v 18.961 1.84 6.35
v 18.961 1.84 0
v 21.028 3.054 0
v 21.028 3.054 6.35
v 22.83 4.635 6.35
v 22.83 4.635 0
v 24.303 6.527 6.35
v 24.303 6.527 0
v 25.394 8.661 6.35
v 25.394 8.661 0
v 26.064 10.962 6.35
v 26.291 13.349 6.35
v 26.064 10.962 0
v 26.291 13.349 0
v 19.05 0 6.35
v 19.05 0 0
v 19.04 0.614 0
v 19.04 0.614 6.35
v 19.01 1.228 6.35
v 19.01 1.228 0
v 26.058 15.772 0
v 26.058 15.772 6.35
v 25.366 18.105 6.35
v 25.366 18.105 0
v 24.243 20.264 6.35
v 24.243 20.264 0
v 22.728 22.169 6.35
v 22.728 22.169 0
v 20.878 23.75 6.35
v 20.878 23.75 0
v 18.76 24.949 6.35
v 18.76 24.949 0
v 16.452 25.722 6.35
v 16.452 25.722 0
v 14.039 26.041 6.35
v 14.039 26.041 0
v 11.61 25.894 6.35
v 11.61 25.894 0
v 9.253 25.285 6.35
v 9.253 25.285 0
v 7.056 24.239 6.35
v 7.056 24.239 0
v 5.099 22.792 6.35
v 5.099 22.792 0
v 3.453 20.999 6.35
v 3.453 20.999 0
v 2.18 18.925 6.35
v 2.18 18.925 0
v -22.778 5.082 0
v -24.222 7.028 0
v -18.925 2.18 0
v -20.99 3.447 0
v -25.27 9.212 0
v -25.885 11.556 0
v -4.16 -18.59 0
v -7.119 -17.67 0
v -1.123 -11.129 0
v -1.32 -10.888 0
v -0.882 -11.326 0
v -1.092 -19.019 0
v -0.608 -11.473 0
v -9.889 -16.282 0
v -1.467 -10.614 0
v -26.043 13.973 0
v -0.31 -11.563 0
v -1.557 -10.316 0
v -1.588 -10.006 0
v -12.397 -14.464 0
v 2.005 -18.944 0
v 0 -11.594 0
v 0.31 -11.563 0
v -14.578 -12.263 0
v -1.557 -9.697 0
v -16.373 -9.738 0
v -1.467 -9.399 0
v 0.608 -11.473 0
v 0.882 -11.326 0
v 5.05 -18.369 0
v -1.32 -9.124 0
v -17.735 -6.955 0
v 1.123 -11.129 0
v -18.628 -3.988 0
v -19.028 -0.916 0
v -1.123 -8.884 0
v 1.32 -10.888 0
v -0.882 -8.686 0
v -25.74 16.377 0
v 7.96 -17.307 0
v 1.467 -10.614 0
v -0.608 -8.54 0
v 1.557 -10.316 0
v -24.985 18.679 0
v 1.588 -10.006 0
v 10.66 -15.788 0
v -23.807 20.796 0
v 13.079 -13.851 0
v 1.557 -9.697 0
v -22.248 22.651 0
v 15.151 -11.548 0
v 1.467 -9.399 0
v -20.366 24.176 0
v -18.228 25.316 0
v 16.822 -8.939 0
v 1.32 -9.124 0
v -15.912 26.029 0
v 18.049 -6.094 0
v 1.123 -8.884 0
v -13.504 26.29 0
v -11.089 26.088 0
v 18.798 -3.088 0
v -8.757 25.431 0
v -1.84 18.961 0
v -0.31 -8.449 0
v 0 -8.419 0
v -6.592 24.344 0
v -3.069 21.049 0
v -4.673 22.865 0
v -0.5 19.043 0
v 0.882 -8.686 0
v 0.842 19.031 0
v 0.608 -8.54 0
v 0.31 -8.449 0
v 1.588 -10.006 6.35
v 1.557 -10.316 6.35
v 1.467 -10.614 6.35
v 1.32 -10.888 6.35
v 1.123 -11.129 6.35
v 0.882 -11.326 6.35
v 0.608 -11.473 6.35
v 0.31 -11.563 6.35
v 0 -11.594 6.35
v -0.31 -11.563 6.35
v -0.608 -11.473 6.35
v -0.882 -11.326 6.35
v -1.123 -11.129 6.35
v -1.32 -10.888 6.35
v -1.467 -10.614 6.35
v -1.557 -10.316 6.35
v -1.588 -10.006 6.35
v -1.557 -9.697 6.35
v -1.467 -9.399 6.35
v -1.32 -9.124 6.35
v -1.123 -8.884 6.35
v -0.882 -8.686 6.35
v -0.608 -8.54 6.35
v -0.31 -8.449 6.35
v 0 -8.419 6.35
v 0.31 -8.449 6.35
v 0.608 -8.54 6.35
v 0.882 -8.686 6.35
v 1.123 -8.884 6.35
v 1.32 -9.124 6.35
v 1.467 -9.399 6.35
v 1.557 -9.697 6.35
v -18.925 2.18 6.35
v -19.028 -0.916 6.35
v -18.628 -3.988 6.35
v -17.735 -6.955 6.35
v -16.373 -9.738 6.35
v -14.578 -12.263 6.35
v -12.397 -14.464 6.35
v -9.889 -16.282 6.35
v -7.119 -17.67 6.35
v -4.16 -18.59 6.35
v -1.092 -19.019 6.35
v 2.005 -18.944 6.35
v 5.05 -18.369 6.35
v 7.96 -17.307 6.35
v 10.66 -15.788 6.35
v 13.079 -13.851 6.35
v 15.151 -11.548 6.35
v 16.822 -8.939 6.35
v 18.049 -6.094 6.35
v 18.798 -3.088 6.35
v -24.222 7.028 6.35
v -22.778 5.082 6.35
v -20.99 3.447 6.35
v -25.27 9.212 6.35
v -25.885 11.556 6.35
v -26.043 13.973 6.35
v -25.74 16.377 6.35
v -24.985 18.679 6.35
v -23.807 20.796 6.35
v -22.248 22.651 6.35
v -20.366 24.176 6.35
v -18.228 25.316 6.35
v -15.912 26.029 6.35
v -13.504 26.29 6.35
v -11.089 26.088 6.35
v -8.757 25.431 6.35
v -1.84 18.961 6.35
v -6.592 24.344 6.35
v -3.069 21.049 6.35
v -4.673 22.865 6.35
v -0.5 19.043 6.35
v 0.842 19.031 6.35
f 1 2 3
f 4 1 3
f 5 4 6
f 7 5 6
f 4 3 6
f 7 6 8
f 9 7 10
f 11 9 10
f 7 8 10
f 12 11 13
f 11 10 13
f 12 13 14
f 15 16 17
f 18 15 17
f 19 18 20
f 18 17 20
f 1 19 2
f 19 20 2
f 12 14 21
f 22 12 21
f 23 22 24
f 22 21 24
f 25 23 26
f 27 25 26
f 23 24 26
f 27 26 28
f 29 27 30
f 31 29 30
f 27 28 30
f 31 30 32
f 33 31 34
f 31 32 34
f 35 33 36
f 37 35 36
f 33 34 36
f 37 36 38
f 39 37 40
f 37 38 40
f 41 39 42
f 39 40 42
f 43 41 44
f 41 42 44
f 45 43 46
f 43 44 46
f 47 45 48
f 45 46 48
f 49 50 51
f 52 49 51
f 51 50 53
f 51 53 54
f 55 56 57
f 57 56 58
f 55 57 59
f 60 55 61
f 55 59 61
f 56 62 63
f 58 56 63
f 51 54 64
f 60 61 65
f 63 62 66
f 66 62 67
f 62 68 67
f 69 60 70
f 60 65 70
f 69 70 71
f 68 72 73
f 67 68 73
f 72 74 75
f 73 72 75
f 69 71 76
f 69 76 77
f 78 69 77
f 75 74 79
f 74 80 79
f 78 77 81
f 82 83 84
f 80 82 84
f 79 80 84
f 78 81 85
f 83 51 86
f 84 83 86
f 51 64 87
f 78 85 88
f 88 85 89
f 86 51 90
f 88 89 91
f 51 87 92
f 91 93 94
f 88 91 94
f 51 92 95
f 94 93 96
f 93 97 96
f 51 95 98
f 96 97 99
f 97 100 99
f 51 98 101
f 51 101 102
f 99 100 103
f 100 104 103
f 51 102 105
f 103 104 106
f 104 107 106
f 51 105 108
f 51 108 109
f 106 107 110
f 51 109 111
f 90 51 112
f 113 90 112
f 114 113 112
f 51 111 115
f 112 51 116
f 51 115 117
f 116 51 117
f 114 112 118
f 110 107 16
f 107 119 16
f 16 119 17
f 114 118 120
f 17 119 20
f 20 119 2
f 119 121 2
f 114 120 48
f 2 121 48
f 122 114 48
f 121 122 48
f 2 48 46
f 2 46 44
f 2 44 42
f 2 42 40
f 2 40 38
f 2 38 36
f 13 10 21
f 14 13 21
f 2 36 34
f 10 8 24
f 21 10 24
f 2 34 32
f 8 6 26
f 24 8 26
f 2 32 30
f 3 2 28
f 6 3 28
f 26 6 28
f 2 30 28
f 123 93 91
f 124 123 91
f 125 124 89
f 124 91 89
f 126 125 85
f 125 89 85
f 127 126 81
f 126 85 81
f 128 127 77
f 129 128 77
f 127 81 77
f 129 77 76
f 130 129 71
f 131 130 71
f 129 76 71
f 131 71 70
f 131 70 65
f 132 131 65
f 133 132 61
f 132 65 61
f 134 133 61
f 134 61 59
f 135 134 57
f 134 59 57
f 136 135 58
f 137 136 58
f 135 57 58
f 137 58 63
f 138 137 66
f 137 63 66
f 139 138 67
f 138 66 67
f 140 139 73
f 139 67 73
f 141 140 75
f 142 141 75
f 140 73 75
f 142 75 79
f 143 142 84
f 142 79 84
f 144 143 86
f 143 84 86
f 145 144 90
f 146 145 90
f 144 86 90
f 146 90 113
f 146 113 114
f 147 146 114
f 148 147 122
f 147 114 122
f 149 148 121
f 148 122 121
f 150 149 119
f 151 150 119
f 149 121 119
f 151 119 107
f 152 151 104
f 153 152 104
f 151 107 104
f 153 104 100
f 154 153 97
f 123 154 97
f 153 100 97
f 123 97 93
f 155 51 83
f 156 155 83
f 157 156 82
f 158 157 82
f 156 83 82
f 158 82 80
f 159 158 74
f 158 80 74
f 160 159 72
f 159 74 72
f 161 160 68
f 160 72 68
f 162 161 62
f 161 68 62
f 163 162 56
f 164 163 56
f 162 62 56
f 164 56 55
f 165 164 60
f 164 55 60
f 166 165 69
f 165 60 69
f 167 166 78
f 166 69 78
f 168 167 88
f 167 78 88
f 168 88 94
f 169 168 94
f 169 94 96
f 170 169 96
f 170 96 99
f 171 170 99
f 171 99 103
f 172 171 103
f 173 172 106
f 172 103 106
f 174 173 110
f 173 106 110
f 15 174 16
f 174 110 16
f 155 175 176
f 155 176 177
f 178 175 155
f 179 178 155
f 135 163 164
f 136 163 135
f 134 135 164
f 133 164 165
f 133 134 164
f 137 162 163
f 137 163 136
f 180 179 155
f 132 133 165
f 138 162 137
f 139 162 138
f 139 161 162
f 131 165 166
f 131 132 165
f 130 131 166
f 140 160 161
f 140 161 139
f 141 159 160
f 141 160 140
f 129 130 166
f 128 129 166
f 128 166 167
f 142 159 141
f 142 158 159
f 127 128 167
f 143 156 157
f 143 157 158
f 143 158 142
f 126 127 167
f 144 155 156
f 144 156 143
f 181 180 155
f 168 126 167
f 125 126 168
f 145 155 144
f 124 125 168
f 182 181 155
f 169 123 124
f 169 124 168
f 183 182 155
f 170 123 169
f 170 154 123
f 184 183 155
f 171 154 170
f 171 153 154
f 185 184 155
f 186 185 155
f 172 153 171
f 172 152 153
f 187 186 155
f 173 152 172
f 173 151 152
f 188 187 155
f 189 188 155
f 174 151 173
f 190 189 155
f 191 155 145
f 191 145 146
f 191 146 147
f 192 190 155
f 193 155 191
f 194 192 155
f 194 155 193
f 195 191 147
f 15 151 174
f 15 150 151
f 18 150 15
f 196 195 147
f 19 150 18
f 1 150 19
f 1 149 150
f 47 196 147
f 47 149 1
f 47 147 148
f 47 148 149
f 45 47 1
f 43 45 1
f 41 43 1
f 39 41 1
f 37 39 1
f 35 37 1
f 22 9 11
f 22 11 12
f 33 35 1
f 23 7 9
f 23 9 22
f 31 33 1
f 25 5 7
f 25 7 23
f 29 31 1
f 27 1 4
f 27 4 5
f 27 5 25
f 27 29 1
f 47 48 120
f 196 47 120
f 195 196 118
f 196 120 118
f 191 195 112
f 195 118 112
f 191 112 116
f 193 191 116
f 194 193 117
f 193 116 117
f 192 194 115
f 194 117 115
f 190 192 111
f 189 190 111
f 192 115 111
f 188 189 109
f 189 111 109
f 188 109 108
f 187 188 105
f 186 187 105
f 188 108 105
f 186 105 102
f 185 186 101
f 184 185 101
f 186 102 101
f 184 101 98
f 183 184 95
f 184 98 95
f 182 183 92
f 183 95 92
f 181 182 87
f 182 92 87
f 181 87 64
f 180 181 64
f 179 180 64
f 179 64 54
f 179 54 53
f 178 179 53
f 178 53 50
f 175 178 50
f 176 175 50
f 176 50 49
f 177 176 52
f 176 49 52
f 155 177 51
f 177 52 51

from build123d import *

# Parameters (mm, degrees)
F1_DEPTH = 6.35
F2_R     = 1.5875
F3_DEPTH = 6.35


with BuildPart() as f1:
    # F0 (on Top) → F1 (new body)
    with BuildSketch(Plane.XY):
        with BuildLine():
            ThreePointArc((-1.8402014017, 18.9609113389), (-22.248244758, 22.6512274543), (-18.9248270392, 2.1802342852))
            ThreePointArc((-18.9248270392, 2.1802342852), (-13.3489468548, 13.5907364726), (-1.8402014017, 18.9609113389))
        make_face()
        with BuildLine():
            ThreePointArc((-1.8402014017, 18.9609113389), (-13.3489468548, 13.5907364726), (-18.9248270392, 2.1802342852))
            ThreePointArc((-18.9248270392, 2.1802342852), (-6.6230148875, 2.8180005541), (-0.6489468548, 13.5907364726))
            ThreePointArc((-0.6489468548, 13.5907364726), (-0.9503367058, 16.3410939716), (-1.8402014017, 18.9609113389))
        make_face()
        with BuildLine():
            ThreePointArc((2.1802342852, 18.9248270392), (4.5302454909, 4.4496489516), (18.9609113389, 1.8402014017))
            ThreePointArc((18.9609113389, 1.8402014017), (13.5907364726, 13.3489468548), (2.1802342852, 18.9248270392))
        make_face()
        with BuildLine():
            ThreePointArc((2.1802342852, 18.9248270392), (13.5907364726, 13.3489468548), (18.9609113389, 1.8402014017))
            ThreePointArc((18.9609113389, 1.8402014017), (24.3026742245, 6.5266019794), (26.2907364726, 13.3489468548))
            ThreePointArc((26.2907364726, 13.3489468548), (16.4522589886, 25.7223735786), (2.1802342852, 18.9248270392))
        make_face()
        with BuildLine():
            ThreePointArc((-18.9248270392, 2.1802342852), (-1.0919122914, -19.0186810149), (19.05, 0))
            ThreePointArc((19.05, 0), (19.0277147998, 0.9211783199), (18.9609113389, 1.8402014017))
            ThreePointArc((18.9609113389, 1.8402014017), (4.5302454909, 4.4496489516), (2.1802342852, 18.9248270392))
            ThreePointArc((2.1802342852, 18.9248270392), (0.1709710784, 19.0492327638), (-1.8402014017, 18.9609113389))
            ThreePointArc((-1.8402014017, 18.9609113389), (-0.9503367058, 16.3410939716), (-0.6489468548, 13.5907364726))
            ThreePointArc((-0.6489468548, 13.5907364726), (-6.6230148875, 2.8180005541), (-18.9248270392, 2.1802342852))
        make_face()
    extrude(amount=F1_DEPTH)

    # F2 (on face) → F3 (cut, through all)
    with BuildSketch(Plane(origin=(0, 0, 0), x_dir=(1, 0, 0), z_dir=(0, 0, -1))):
        with Locations((0, 10.0062619895)):
            Circle(F2_R)
    extrude(amount=-F3_DEPTH, mode=Mode.SUBTRACT)


solid = f1.part
